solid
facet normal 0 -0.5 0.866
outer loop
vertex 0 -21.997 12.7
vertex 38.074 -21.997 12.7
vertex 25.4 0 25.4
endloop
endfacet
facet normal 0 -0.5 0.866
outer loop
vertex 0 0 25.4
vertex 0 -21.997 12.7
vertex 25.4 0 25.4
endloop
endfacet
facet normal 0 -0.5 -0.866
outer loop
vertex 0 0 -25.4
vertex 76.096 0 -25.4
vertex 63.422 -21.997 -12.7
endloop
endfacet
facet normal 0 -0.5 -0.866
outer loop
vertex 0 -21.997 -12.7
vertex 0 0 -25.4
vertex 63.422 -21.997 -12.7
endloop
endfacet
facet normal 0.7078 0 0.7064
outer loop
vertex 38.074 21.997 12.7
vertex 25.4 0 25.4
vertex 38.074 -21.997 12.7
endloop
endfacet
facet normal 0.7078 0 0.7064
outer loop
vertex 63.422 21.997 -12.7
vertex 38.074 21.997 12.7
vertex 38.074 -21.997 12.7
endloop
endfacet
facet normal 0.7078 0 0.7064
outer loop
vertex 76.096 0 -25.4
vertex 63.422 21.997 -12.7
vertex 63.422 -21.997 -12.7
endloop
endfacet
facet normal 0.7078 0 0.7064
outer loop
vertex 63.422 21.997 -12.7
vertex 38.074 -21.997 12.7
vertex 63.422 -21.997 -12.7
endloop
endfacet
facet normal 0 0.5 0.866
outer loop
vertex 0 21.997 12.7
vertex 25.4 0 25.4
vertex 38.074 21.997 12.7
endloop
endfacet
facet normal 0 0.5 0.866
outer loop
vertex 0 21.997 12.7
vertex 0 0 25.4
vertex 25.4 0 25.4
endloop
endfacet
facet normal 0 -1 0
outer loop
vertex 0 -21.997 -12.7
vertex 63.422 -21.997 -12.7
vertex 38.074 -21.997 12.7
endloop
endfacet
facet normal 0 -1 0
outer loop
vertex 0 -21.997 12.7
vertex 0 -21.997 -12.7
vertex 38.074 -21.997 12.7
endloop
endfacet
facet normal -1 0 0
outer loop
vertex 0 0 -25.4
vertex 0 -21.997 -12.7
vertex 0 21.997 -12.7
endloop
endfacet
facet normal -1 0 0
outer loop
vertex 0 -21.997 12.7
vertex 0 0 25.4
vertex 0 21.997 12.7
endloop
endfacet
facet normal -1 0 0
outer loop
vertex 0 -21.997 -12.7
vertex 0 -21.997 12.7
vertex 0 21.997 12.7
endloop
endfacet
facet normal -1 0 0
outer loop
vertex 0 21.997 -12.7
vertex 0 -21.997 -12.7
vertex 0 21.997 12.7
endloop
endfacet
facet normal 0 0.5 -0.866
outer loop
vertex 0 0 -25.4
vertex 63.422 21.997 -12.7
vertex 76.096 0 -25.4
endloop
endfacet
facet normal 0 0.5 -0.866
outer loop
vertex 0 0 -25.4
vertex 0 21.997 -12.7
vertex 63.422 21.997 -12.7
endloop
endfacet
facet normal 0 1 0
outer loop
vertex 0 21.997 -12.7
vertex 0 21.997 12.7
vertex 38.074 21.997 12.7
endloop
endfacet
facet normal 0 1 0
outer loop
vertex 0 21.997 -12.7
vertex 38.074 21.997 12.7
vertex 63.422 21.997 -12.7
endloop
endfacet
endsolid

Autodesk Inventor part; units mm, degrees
ref_plane "YZ Plane" through (0, 0, 0) normal (1, 0, 0) x (0, 1, 0)
ref_plane "XZ Plane" through (0, 0, 0) normal (0, 1, 0) x (-1, 0, 0)
ref_plane "XY Plane" through (0, 0, 0) normal (0, 0, 1) x (1, 0, 0)
sketch "Sketch1" plane through (0, 0, 0) normal (1, 0, 0) x (0, 1, 0)
  circle A0 centre (0, 0) radius 25.4
  line L0 (0, -25.4) -> (-21.997, -12.7)
  line L1 (-21.997, -12.7) -> (-21.997, 12.7)
  line L2 (-21.997, 12.7) -> (0, 25.4)
  line L3 (0, 25.4) -> (21.997, 12.7)
  line L4 (21.997, 12.7) -> (21.997, -12.7)
  line L5 (21.997, -12.7) -> (0, -25.4)
  dimension "d0" = 50.8
extrude "Extrusion1" add sketch "Sketch1" along normal blind 76.2 contours L4 L5 L0 L1 L2 L3
sketch "Sketch2" plane through (0, 0, 0) normal (0, 1, 0) x (-1, 0, 0)
  line L0 (0, 25.4259) -> (-25.4, 25.4)
  line L1 (0, 25.4) -> (-76.2, 25.4) projected
  line L2 (-25.4, 25.4) -> (-79.2265, -28.5365)
  line L3 (-79.2265, -28.5365) -> (-79.2893, 33.005)
  line L4 (-79.2893, 33.005) -> (-25.4, 25.4)
  point P0 (0, 0)
  dimension "d3" = 25.4
  dimension "d4" = 76.2
  dimension "d5" = 135
extrude "Extrusion2" cut sketch "Sketch2" along normal mid plane 76.2
